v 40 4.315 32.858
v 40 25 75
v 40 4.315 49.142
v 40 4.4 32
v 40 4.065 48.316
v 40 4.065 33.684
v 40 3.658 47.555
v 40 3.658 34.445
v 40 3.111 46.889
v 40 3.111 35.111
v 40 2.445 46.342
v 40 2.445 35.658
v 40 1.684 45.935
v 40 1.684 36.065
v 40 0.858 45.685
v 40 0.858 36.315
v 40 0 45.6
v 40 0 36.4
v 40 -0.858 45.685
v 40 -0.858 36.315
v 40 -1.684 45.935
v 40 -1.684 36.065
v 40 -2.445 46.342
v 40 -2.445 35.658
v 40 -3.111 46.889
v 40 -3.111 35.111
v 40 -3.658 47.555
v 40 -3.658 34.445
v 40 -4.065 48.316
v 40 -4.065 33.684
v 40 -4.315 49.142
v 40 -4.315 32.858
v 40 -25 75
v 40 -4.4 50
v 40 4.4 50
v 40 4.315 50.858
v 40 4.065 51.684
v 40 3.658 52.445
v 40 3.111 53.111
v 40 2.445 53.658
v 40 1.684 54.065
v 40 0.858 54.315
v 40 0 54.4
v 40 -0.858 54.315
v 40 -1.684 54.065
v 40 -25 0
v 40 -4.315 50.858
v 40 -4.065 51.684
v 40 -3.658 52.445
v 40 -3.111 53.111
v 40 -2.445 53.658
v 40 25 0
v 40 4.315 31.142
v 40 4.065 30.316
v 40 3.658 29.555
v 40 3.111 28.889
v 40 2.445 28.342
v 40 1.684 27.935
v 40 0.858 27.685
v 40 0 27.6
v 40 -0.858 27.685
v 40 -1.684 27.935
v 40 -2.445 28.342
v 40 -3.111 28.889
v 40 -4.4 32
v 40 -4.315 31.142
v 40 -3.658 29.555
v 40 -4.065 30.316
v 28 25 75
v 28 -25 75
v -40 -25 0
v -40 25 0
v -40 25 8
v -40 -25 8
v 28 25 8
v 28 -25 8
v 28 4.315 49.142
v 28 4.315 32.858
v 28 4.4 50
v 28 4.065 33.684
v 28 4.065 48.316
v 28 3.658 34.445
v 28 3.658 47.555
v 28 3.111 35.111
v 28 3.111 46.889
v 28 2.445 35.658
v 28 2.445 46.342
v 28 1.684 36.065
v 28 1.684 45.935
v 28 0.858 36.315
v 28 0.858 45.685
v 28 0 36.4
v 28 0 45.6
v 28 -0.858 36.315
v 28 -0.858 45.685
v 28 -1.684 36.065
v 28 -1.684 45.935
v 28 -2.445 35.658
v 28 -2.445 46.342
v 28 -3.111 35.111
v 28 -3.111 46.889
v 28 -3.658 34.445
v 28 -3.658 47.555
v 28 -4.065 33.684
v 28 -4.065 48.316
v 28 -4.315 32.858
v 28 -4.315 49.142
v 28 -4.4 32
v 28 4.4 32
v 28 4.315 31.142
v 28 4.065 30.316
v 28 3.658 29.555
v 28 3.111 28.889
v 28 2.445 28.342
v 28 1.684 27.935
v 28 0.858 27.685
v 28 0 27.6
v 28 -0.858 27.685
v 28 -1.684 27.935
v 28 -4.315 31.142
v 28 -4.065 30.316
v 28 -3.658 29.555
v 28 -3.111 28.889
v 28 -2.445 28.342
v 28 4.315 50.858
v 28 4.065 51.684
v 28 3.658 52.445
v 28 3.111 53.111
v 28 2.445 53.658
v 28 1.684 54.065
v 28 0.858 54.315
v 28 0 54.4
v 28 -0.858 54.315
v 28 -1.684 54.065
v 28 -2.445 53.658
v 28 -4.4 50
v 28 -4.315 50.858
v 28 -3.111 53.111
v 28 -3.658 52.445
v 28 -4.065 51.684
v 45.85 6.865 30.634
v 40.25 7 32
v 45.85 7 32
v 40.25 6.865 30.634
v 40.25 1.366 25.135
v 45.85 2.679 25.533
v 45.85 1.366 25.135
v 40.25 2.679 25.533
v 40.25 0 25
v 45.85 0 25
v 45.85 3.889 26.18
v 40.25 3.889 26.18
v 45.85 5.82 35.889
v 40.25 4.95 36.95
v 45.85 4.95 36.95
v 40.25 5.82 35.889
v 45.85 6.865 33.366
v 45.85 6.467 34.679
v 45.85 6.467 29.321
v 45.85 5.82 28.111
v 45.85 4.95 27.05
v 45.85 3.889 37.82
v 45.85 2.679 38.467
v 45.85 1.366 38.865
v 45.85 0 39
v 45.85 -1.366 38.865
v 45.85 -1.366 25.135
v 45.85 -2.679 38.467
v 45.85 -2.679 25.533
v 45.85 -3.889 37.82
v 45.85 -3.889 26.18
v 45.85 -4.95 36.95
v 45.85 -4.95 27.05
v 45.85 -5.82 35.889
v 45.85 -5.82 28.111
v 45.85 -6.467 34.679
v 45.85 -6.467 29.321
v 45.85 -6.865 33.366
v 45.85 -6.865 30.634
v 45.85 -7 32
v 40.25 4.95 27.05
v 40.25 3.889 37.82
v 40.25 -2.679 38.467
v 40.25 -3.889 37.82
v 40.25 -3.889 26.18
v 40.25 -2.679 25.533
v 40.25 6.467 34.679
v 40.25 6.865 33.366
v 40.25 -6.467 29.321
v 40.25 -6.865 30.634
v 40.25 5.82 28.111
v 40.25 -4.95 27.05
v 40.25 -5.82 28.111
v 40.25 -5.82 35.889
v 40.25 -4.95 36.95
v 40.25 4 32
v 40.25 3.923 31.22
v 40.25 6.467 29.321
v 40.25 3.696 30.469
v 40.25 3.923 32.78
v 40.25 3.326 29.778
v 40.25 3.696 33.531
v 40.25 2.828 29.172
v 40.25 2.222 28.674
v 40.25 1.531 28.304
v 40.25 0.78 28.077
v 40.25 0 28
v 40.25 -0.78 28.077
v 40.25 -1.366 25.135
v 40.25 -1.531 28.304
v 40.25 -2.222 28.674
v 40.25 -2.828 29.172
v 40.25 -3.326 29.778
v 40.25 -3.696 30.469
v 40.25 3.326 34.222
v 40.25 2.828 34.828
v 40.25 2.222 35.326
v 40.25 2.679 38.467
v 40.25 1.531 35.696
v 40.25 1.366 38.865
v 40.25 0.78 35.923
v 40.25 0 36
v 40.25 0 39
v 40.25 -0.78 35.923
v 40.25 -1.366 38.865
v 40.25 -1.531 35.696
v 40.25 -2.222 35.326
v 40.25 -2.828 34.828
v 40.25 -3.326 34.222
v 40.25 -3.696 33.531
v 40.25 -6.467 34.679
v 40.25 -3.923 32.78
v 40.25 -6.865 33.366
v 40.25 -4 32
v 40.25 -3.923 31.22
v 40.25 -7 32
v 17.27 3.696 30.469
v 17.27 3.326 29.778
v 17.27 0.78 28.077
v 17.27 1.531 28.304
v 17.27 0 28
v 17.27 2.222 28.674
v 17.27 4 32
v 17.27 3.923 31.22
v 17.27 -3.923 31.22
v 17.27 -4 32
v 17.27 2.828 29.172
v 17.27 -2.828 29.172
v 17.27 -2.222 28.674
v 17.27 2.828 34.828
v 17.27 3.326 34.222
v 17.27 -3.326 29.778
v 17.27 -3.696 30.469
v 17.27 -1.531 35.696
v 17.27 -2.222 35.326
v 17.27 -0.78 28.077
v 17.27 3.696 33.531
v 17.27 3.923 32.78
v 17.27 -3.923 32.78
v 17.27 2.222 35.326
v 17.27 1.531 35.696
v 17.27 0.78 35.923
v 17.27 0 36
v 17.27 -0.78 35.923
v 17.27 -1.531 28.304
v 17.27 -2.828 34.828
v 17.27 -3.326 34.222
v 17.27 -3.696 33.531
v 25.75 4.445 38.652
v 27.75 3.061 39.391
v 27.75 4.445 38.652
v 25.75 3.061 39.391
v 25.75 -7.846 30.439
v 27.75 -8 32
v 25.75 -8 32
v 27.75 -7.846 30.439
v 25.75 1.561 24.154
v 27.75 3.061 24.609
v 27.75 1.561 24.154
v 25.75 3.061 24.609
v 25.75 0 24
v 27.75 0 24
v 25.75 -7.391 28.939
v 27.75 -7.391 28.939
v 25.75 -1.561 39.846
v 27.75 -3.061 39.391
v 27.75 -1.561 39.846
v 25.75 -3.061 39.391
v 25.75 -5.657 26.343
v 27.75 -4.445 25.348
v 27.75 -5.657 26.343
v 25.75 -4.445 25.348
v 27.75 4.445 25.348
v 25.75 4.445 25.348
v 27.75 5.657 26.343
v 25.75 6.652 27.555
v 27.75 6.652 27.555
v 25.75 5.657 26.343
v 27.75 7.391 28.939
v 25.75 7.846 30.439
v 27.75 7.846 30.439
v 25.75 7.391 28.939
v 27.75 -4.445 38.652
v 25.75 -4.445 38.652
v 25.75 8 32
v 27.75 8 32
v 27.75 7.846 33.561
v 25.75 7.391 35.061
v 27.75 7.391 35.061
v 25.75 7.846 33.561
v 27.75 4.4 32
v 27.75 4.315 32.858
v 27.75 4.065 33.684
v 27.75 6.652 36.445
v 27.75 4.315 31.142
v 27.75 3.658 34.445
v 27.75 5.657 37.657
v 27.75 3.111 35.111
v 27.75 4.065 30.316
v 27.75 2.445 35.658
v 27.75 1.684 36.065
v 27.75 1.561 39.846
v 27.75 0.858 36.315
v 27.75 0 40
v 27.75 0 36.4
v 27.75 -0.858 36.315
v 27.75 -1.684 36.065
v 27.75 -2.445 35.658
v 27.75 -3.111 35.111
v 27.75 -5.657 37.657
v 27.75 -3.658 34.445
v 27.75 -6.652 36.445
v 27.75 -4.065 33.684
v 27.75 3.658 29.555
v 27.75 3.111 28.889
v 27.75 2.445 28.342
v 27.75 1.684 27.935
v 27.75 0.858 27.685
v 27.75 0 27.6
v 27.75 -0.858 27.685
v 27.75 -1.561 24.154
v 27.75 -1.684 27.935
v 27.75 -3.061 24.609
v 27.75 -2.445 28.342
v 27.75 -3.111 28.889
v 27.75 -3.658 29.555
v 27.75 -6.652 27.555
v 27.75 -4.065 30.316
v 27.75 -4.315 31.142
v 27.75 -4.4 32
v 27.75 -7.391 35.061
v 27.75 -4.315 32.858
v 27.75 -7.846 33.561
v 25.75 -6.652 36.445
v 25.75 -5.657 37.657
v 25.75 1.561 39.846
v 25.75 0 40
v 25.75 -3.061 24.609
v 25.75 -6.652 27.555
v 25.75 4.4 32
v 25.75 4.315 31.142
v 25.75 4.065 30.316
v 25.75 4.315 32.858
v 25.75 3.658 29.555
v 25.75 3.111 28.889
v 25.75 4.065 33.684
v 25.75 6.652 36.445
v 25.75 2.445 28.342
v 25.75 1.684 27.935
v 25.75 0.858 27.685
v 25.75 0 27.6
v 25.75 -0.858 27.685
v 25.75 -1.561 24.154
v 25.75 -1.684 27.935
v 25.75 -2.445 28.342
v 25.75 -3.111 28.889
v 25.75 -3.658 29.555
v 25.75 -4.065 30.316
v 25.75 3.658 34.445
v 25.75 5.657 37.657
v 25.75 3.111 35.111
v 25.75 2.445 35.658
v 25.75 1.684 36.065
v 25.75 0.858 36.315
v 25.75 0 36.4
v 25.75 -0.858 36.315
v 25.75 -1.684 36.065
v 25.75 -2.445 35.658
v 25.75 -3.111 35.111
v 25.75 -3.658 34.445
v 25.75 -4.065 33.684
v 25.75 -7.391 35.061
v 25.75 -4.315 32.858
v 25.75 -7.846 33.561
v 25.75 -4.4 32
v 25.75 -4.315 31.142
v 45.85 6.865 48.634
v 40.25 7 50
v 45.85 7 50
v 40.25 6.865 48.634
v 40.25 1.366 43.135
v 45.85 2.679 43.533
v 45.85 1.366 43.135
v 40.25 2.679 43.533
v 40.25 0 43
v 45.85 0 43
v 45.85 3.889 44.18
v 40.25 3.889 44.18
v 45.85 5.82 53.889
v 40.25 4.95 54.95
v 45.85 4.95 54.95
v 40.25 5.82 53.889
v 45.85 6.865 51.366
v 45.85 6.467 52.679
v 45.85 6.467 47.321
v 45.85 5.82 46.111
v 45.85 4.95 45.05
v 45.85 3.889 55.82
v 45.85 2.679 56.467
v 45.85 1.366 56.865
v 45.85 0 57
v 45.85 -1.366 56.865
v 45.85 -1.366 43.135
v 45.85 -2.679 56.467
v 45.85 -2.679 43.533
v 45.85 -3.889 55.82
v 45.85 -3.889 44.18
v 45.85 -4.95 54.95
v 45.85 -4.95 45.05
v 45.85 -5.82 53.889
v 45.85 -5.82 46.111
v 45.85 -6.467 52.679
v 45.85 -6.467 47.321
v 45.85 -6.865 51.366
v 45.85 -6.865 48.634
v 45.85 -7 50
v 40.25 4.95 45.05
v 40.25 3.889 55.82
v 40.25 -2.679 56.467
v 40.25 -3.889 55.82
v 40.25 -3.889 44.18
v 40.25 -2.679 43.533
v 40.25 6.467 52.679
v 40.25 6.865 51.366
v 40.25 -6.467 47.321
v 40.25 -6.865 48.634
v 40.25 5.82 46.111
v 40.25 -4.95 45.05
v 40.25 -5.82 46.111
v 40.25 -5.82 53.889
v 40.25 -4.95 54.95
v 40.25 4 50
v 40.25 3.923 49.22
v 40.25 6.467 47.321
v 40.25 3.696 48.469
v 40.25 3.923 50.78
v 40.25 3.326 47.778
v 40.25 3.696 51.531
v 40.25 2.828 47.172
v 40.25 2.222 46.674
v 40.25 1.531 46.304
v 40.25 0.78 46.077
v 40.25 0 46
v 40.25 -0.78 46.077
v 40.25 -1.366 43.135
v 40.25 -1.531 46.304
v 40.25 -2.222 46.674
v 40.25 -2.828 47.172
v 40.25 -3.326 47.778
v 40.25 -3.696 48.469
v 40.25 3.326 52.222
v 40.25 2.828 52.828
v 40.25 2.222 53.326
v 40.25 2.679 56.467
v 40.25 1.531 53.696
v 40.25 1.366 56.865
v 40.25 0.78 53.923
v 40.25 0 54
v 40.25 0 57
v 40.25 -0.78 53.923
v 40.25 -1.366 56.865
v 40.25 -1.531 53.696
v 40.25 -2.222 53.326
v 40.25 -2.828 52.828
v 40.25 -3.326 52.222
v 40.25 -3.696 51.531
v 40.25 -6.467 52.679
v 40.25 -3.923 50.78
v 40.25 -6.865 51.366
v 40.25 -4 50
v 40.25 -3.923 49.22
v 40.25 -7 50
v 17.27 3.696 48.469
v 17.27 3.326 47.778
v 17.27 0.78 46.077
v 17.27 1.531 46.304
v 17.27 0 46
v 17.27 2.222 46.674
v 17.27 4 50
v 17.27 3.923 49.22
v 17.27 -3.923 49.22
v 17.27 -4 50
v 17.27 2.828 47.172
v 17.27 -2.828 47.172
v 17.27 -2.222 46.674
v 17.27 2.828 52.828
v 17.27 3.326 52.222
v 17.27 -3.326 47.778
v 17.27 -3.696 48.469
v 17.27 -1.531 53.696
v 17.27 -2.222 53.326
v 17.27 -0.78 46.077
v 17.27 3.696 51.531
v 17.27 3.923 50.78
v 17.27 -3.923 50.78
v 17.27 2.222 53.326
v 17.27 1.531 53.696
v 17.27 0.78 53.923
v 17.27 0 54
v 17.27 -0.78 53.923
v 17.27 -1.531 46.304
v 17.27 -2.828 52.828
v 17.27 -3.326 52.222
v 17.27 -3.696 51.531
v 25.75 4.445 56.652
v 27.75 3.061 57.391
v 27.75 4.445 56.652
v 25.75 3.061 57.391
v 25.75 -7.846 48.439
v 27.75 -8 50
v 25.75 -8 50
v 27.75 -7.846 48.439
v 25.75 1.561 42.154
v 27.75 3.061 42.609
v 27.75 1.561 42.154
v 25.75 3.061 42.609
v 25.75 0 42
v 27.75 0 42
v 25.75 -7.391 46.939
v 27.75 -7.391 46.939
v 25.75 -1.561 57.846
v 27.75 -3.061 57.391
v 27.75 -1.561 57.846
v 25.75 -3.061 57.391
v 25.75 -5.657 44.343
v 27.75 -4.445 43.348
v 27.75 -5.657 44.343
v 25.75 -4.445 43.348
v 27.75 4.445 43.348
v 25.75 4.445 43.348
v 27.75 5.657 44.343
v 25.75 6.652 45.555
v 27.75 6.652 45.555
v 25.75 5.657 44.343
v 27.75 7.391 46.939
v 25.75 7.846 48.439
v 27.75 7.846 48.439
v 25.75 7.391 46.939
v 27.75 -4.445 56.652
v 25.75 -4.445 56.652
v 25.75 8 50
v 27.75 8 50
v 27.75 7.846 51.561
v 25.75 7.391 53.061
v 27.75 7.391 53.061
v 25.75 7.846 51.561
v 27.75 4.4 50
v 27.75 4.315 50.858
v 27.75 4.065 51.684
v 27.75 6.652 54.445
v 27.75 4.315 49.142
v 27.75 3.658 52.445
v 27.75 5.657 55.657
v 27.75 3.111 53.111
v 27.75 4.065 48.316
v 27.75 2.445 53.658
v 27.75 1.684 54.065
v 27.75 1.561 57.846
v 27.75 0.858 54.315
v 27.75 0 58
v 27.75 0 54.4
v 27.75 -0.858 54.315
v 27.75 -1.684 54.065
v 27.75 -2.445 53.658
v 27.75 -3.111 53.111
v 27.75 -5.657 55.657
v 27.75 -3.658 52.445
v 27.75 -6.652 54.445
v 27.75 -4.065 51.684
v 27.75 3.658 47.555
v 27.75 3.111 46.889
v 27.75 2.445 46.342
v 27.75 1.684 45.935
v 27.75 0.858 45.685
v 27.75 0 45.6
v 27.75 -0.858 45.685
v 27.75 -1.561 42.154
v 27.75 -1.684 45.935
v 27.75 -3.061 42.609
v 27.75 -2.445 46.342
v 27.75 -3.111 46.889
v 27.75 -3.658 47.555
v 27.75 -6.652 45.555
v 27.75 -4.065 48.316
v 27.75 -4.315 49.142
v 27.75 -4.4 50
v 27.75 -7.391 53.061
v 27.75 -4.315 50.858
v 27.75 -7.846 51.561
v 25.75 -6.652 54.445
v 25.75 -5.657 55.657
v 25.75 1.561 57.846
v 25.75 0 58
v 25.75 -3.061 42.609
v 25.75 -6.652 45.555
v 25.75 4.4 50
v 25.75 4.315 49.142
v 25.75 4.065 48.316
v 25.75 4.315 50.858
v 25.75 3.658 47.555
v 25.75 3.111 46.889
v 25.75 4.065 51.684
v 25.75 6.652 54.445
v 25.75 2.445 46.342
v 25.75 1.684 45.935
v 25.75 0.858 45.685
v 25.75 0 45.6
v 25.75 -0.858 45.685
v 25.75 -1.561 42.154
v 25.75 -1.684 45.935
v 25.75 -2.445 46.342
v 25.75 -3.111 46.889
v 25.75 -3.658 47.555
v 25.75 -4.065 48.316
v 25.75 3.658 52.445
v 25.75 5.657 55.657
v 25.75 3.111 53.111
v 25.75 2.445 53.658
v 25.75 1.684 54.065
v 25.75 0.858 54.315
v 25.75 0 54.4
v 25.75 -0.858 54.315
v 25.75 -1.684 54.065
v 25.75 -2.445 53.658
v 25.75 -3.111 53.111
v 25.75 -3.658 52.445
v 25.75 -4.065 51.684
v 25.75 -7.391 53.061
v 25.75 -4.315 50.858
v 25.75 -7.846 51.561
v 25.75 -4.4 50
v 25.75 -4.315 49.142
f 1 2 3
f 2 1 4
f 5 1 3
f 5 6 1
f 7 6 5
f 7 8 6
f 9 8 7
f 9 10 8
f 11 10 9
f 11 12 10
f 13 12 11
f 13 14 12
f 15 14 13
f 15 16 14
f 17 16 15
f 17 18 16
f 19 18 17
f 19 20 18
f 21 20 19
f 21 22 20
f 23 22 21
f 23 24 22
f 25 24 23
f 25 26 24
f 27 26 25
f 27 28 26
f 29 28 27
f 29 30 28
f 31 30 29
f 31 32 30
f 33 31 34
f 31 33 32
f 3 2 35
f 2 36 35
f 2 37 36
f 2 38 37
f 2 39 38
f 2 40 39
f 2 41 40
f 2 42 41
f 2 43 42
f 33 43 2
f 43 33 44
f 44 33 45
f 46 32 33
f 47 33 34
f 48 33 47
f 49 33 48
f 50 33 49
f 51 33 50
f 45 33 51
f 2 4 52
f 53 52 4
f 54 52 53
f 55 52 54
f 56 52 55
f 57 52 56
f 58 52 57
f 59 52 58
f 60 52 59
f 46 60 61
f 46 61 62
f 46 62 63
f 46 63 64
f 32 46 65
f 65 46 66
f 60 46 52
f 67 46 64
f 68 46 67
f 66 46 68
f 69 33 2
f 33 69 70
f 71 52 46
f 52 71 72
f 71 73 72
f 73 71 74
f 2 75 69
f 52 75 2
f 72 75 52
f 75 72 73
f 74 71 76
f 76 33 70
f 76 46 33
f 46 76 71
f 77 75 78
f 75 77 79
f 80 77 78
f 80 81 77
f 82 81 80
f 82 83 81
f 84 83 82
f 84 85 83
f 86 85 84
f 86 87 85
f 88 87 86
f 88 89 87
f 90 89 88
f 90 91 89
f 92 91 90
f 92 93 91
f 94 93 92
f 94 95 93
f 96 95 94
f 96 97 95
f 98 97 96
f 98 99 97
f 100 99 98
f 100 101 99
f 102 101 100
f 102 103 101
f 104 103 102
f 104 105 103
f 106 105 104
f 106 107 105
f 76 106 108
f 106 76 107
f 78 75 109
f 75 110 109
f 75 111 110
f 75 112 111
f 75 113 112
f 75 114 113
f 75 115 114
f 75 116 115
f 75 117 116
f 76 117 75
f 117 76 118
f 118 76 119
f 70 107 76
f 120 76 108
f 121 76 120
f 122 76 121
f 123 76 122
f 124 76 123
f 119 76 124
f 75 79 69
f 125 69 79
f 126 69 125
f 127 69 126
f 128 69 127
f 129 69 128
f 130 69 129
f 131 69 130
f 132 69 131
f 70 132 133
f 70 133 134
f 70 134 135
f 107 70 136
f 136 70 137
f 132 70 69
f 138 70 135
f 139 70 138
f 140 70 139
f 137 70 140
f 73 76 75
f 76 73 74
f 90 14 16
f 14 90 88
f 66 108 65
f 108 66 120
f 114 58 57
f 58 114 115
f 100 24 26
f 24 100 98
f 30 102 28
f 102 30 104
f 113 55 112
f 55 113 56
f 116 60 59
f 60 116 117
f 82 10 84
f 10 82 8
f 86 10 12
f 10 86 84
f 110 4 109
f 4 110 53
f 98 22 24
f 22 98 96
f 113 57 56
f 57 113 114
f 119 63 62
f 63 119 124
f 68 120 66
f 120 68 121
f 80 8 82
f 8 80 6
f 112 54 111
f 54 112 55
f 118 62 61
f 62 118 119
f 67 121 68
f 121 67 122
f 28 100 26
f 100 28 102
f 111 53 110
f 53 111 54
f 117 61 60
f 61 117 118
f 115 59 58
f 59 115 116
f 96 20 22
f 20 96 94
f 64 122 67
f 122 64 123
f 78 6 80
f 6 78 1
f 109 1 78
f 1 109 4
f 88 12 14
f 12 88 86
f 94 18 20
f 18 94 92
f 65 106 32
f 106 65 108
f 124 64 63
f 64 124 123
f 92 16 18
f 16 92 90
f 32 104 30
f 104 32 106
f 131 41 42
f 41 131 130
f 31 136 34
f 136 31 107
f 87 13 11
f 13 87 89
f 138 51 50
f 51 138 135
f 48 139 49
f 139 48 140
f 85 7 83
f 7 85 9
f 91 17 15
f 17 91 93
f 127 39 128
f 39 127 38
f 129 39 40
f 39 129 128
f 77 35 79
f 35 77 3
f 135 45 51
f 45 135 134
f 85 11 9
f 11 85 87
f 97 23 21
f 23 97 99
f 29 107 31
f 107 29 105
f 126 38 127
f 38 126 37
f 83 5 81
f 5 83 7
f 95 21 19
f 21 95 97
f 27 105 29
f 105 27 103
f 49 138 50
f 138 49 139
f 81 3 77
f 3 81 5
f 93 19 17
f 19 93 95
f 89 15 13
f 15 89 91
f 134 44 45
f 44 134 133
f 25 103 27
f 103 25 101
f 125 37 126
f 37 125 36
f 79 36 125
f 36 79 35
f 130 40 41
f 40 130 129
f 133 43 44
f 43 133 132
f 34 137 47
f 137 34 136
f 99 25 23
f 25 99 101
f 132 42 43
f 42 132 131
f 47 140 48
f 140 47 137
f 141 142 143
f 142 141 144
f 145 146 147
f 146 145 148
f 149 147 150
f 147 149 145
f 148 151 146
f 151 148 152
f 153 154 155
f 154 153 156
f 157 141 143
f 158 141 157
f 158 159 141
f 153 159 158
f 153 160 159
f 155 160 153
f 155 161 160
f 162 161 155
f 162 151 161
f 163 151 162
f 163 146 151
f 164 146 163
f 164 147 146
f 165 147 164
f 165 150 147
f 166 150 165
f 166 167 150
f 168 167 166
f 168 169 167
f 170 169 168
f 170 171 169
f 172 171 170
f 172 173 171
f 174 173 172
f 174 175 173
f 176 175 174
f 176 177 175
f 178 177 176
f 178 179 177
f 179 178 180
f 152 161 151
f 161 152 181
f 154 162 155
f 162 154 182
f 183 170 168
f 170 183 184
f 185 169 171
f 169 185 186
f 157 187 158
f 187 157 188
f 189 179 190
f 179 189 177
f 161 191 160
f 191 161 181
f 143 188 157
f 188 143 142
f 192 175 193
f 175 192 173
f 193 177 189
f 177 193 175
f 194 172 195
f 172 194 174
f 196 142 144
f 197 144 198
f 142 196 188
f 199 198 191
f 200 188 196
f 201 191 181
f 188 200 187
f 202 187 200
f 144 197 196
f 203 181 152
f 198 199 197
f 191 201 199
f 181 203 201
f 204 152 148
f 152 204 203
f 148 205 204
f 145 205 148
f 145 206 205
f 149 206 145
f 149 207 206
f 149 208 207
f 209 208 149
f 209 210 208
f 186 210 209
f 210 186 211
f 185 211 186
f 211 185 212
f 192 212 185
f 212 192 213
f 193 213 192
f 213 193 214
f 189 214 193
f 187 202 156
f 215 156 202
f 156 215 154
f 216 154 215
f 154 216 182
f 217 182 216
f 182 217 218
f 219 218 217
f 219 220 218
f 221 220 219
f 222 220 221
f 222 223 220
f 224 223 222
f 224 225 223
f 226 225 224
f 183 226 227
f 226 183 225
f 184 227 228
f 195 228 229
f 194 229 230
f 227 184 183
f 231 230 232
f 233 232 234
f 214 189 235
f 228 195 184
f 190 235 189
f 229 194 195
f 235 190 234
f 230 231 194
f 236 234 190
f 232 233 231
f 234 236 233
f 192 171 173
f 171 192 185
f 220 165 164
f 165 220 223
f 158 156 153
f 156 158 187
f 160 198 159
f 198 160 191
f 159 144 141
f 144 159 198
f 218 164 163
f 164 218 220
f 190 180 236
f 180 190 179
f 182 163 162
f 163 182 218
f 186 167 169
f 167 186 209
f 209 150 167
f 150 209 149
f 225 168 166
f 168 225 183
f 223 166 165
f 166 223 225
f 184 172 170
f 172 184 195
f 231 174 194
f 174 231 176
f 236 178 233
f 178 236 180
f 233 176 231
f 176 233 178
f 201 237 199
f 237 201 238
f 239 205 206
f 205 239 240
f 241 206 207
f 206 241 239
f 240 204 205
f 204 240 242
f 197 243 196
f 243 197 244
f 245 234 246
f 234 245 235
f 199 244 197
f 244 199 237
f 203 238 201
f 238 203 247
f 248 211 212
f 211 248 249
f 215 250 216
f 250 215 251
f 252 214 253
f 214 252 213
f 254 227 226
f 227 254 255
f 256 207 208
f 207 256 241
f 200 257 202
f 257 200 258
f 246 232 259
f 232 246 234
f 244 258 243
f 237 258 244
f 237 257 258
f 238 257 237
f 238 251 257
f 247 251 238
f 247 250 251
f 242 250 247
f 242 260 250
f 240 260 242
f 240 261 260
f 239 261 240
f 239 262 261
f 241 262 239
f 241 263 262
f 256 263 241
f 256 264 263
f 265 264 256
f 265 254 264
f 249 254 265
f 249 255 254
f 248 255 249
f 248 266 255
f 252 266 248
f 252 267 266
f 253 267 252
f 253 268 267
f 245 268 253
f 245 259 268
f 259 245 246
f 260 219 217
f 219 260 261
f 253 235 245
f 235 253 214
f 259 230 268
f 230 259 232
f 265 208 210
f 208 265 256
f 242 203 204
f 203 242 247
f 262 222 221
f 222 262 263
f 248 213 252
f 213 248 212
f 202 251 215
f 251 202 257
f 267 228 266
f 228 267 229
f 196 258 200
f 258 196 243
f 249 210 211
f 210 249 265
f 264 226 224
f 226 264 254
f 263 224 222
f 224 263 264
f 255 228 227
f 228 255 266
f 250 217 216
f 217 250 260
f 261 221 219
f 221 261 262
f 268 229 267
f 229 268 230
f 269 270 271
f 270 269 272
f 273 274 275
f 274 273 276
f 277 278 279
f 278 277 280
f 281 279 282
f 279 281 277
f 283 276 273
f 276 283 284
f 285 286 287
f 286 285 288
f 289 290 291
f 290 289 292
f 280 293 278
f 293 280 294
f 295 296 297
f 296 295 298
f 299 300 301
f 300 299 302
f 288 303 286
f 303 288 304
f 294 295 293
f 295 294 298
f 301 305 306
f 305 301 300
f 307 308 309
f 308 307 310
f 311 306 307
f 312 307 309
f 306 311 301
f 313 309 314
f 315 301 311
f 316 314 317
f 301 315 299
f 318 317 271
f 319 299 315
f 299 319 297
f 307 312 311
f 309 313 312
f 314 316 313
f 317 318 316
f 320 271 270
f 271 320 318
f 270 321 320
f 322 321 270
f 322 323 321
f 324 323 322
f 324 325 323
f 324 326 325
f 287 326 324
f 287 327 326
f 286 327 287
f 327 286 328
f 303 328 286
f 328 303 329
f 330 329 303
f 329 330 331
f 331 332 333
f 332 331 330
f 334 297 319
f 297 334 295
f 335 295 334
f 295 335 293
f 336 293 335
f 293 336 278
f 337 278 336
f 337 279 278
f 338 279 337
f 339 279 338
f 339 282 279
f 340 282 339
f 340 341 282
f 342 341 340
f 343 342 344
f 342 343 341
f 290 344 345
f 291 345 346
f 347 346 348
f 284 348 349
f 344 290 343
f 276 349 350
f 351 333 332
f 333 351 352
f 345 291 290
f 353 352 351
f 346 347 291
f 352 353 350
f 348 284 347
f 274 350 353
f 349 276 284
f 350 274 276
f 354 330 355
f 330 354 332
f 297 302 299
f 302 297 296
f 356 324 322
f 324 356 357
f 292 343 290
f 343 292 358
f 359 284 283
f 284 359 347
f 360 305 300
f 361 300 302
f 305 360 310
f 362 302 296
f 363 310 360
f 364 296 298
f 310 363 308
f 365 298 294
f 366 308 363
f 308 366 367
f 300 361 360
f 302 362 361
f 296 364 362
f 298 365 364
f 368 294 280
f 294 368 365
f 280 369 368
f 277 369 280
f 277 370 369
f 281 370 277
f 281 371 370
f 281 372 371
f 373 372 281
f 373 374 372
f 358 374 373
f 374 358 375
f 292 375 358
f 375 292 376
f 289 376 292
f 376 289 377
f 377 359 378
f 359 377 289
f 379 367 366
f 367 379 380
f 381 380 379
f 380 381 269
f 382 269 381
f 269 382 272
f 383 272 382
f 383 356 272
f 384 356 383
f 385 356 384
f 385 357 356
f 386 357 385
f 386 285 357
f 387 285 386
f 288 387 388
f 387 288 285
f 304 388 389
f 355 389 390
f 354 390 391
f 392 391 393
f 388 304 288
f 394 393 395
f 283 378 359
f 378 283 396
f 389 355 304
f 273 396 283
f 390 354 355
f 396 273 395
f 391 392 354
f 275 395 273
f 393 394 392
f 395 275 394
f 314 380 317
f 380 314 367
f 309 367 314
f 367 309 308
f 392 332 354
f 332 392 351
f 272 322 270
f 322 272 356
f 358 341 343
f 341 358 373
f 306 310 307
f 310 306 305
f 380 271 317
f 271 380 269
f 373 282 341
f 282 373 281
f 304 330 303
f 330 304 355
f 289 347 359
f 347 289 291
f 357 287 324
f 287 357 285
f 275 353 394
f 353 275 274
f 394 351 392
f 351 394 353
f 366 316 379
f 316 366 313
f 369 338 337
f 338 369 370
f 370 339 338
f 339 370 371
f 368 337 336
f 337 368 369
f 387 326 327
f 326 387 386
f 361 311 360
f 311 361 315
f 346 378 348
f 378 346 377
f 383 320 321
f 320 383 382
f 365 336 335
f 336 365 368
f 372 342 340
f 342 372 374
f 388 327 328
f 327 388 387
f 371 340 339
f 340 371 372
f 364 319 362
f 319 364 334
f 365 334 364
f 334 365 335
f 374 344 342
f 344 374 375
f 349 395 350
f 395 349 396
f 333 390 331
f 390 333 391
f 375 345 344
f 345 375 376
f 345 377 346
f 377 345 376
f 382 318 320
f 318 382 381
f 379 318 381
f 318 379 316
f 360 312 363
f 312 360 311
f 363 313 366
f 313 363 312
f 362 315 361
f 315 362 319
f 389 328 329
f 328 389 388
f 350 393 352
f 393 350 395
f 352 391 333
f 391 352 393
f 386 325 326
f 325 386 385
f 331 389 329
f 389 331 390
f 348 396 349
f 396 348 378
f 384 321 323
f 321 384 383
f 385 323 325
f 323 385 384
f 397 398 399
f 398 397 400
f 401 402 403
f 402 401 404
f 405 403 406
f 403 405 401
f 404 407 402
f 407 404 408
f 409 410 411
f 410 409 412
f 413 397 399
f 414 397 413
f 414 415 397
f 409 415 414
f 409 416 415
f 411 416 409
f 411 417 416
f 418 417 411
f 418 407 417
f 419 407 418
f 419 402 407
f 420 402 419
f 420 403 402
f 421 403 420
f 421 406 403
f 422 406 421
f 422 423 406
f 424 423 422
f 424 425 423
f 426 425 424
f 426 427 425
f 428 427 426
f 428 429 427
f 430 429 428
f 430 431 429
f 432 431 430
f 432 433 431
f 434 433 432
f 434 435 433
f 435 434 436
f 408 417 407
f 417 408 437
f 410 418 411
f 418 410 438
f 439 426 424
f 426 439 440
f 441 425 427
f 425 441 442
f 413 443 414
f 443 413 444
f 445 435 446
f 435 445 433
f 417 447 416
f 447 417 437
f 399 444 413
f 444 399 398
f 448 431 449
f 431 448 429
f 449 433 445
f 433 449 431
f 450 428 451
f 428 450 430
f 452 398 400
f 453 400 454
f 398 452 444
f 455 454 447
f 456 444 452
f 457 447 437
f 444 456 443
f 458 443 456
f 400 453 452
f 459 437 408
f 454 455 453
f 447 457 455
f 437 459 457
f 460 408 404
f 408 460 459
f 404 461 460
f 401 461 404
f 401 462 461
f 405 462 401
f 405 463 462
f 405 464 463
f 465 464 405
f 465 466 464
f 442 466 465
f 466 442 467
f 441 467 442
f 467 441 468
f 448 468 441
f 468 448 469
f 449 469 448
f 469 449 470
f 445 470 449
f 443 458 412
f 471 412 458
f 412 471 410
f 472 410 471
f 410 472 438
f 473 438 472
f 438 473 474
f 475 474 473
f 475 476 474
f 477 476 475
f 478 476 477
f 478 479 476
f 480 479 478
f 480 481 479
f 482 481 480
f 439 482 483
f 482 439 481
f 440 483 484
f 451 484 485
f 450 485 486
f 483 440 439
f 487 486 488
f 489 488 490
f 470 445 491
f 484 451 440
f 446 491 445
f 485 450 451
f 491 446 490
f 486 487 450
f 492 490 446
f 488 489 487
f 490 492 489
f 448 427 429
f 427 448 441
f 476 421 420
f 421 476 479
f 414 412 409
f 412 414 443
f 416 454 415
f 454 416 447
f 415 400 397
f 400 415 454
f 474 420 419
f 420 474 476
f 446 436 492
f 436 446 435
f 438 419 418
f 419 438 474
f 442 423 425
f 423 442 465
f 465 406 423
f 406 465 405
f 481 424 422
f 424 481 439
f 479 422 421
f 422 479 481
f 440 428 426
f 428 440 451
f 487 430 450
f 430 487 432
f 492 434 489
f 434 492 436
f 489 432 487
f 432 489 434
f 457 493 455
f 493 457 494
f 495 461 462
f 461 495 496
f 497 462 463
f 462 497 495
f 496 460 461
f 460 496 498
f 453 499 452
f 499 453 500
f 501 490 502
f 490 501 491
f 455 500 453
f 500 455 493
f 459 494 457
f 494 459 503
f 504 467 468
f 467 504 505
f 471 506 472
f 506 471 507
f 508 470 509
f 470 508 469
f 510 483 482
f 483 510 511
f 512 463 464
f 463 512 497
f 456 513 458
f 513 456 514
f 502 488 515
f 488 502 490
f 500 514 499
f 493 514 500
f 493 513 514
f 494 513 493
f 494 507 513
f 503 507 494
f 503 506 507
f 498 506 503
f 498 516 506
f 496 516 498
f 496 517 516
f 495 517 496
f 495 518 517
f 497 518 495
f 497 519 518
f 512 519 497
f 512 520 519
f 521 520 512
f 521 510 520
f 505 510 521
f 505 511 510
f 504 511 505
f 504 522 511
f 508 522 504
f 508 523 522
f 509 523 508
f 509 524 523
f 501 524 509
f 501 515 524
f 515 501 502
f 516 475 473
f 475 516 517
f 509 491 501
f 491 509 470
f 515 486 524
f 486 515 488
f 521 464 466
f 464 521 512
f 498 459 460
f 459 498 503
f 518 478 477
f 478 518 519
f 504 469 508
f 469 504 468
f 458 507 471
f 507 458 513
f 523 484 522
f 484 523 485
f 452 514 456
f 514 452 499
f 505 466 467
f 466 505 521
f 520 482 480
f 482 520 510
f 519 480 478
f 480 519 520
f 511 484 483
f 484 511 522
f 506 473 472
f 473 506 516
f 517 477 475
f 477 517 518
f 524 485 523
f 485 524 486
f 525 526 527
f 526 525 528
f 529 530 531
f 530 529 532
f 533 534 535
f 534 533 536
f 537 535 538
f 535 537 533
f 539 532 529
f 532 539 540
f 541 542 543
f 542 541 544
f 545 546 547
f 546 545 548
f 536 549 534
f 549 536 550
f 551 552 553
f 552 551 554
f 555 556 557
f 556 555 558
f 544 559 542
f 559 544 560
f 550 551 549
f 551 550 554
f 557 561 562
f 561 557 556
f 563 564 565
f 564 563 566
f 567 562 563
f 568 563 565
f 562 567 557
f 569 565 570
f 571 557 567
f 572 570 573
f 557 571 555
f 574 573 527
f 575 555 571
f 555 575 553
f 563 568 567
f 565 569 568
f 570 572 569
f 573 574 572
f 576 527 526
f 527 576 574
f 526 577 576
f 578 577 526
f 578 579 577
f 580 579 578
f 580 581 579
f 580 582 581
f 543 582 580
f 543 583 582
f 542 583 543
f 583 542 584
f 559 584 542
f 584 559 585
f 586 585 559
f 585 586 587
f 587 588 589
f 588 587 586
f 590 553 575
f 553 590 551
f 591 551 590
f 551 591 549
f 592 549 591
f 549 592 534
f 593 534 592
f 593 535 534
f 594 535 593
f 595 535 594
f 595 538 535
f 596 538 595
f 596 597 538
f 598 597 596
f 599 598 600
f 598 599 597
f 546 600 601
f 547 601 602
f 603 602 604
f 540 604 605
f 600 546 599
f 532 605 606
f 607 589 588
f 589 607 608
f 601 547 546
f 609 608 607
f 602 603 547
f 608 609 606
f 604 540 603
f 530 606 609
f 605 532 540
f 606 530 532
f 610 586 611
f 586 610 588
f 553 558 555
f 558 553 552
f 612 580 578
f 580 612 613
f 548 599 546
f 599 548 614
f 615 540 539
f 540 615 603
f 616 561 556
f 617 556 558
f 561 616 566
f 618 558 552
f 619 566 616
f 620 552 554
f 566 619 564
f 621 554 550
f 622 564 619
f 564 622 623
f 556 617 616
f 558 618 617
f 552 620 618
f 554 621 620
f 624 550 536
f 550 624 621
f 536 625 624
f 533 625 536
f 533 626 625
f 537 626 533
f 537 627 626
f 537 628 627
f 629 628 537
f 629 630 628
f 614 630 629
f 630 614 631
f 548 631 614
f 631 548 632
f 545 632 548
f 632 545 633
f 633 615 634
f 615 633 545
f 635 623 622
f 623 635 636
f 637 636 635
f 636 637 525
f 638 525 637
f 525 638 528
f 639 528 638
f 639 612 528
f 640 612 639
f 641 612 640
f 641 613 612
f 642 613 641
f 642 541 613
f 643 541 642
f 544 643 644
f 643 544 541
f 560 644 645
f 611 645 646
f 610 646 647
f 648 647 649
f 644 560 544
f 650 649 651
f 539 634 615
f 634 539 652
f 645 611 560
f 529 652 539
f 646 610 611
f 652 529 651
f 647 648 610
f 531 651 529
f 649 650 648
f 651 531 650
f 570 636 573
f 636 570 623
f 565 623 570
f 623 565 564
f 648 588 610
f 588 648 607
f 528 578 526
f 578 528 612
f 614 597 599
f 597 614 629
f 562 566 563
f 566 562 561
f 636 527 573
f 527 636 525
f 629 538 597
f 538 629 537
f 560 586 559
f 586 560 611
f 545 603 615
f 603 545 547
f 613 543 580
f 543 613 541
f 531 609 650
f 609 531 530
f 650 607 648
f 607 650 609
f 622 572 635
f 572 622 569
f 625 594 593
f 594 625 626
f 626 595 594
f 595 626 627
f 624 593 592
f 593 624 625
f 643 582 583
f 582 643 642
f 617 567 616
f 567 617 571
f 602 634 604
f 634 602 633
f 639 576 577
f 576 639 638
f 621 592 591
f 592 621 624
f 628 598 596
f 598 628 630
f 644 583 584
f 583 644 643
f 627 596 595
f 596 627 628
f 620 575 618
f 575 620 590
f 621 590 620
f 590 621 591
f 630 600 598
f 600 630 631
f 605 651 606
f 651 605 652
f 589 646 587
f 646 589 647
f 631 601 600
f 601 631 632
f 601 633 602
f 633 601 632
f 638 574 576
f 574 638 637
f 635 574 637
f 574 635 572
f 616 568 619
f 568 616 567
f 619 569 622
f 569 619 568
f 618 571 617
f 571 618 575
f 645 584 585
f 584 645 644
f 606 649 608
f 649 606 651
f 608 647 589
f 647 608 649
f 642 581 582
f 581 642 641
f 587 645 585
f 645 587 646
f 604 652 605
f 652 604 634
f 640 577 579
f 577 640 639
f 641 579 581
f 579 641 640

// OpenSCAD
$fn = 32;

// ------------------------------------------------------------------------
// Bolted bracket: 80 x 50 mm bracket with 2 bolt joints
// Every part is its own module, assembly() places them once.
// ------------------------------------------------------------------------

// --- part 1 ---
module bracket() {
  difference() {
    translate([-40, -25, 0]) cube([80, 50, 75]);
    translate([-41, -26, 8]) cube([69, 52, 68]);
    translate([34, 0, 32]) rotate([0, 90, 0]) cylinder(h = 14, d = 8.8, center = true);
    translate([34, 0, 50]) rotate([0, 90, 0]) cylinder(h = 14, d = 8.8, center = true);
  }
}

// --- part 2 ---
module bolt1() {
  cylinder(h = 5.6, d = 14);
  translate([0, 0, -22.98]) cylinder(h = 22.98, d = 8);
}

// --- part 3 ---
module washer1() {
  difference() {
      translate([0, 0, 0]) cylinder(h = 2, d = 16);
      translate([0, 0, -1]) cylinder(h = 4, d = 8.8);
    }
}

// --- part 4 ---
module bolt2() {
  cylinder(h = 5.6, d = 14);
  translate([0, 0, -22.98]) cylinder(h = 22.98, d = 8);
}

// --- part 5 ---
module washer2() {
  difference() {
      translate([0, 0, 0]) cylinder(h = 2, d = 16);
      translate([0, 0, -1]) cylinder(h = 4, d = 8.8);
    }
}

// --- assembly ---
module assembly() {
  translate([0, 0, 0]) rotate([0, 0, 0]) bracket();
  translate([40.25, 0, 32]) rotate([0, 90, 0]) bolt1();
  translate([25.75, 0, 32]) rotate([0, 90, 0]) washer1();
  translate([40.25, 0, 50]) rotate([0, 90, 0]) bolt2();
  translate([25.75, 0, 50]) rotate([0, 90, 0]) washer2();
}

assembly();
